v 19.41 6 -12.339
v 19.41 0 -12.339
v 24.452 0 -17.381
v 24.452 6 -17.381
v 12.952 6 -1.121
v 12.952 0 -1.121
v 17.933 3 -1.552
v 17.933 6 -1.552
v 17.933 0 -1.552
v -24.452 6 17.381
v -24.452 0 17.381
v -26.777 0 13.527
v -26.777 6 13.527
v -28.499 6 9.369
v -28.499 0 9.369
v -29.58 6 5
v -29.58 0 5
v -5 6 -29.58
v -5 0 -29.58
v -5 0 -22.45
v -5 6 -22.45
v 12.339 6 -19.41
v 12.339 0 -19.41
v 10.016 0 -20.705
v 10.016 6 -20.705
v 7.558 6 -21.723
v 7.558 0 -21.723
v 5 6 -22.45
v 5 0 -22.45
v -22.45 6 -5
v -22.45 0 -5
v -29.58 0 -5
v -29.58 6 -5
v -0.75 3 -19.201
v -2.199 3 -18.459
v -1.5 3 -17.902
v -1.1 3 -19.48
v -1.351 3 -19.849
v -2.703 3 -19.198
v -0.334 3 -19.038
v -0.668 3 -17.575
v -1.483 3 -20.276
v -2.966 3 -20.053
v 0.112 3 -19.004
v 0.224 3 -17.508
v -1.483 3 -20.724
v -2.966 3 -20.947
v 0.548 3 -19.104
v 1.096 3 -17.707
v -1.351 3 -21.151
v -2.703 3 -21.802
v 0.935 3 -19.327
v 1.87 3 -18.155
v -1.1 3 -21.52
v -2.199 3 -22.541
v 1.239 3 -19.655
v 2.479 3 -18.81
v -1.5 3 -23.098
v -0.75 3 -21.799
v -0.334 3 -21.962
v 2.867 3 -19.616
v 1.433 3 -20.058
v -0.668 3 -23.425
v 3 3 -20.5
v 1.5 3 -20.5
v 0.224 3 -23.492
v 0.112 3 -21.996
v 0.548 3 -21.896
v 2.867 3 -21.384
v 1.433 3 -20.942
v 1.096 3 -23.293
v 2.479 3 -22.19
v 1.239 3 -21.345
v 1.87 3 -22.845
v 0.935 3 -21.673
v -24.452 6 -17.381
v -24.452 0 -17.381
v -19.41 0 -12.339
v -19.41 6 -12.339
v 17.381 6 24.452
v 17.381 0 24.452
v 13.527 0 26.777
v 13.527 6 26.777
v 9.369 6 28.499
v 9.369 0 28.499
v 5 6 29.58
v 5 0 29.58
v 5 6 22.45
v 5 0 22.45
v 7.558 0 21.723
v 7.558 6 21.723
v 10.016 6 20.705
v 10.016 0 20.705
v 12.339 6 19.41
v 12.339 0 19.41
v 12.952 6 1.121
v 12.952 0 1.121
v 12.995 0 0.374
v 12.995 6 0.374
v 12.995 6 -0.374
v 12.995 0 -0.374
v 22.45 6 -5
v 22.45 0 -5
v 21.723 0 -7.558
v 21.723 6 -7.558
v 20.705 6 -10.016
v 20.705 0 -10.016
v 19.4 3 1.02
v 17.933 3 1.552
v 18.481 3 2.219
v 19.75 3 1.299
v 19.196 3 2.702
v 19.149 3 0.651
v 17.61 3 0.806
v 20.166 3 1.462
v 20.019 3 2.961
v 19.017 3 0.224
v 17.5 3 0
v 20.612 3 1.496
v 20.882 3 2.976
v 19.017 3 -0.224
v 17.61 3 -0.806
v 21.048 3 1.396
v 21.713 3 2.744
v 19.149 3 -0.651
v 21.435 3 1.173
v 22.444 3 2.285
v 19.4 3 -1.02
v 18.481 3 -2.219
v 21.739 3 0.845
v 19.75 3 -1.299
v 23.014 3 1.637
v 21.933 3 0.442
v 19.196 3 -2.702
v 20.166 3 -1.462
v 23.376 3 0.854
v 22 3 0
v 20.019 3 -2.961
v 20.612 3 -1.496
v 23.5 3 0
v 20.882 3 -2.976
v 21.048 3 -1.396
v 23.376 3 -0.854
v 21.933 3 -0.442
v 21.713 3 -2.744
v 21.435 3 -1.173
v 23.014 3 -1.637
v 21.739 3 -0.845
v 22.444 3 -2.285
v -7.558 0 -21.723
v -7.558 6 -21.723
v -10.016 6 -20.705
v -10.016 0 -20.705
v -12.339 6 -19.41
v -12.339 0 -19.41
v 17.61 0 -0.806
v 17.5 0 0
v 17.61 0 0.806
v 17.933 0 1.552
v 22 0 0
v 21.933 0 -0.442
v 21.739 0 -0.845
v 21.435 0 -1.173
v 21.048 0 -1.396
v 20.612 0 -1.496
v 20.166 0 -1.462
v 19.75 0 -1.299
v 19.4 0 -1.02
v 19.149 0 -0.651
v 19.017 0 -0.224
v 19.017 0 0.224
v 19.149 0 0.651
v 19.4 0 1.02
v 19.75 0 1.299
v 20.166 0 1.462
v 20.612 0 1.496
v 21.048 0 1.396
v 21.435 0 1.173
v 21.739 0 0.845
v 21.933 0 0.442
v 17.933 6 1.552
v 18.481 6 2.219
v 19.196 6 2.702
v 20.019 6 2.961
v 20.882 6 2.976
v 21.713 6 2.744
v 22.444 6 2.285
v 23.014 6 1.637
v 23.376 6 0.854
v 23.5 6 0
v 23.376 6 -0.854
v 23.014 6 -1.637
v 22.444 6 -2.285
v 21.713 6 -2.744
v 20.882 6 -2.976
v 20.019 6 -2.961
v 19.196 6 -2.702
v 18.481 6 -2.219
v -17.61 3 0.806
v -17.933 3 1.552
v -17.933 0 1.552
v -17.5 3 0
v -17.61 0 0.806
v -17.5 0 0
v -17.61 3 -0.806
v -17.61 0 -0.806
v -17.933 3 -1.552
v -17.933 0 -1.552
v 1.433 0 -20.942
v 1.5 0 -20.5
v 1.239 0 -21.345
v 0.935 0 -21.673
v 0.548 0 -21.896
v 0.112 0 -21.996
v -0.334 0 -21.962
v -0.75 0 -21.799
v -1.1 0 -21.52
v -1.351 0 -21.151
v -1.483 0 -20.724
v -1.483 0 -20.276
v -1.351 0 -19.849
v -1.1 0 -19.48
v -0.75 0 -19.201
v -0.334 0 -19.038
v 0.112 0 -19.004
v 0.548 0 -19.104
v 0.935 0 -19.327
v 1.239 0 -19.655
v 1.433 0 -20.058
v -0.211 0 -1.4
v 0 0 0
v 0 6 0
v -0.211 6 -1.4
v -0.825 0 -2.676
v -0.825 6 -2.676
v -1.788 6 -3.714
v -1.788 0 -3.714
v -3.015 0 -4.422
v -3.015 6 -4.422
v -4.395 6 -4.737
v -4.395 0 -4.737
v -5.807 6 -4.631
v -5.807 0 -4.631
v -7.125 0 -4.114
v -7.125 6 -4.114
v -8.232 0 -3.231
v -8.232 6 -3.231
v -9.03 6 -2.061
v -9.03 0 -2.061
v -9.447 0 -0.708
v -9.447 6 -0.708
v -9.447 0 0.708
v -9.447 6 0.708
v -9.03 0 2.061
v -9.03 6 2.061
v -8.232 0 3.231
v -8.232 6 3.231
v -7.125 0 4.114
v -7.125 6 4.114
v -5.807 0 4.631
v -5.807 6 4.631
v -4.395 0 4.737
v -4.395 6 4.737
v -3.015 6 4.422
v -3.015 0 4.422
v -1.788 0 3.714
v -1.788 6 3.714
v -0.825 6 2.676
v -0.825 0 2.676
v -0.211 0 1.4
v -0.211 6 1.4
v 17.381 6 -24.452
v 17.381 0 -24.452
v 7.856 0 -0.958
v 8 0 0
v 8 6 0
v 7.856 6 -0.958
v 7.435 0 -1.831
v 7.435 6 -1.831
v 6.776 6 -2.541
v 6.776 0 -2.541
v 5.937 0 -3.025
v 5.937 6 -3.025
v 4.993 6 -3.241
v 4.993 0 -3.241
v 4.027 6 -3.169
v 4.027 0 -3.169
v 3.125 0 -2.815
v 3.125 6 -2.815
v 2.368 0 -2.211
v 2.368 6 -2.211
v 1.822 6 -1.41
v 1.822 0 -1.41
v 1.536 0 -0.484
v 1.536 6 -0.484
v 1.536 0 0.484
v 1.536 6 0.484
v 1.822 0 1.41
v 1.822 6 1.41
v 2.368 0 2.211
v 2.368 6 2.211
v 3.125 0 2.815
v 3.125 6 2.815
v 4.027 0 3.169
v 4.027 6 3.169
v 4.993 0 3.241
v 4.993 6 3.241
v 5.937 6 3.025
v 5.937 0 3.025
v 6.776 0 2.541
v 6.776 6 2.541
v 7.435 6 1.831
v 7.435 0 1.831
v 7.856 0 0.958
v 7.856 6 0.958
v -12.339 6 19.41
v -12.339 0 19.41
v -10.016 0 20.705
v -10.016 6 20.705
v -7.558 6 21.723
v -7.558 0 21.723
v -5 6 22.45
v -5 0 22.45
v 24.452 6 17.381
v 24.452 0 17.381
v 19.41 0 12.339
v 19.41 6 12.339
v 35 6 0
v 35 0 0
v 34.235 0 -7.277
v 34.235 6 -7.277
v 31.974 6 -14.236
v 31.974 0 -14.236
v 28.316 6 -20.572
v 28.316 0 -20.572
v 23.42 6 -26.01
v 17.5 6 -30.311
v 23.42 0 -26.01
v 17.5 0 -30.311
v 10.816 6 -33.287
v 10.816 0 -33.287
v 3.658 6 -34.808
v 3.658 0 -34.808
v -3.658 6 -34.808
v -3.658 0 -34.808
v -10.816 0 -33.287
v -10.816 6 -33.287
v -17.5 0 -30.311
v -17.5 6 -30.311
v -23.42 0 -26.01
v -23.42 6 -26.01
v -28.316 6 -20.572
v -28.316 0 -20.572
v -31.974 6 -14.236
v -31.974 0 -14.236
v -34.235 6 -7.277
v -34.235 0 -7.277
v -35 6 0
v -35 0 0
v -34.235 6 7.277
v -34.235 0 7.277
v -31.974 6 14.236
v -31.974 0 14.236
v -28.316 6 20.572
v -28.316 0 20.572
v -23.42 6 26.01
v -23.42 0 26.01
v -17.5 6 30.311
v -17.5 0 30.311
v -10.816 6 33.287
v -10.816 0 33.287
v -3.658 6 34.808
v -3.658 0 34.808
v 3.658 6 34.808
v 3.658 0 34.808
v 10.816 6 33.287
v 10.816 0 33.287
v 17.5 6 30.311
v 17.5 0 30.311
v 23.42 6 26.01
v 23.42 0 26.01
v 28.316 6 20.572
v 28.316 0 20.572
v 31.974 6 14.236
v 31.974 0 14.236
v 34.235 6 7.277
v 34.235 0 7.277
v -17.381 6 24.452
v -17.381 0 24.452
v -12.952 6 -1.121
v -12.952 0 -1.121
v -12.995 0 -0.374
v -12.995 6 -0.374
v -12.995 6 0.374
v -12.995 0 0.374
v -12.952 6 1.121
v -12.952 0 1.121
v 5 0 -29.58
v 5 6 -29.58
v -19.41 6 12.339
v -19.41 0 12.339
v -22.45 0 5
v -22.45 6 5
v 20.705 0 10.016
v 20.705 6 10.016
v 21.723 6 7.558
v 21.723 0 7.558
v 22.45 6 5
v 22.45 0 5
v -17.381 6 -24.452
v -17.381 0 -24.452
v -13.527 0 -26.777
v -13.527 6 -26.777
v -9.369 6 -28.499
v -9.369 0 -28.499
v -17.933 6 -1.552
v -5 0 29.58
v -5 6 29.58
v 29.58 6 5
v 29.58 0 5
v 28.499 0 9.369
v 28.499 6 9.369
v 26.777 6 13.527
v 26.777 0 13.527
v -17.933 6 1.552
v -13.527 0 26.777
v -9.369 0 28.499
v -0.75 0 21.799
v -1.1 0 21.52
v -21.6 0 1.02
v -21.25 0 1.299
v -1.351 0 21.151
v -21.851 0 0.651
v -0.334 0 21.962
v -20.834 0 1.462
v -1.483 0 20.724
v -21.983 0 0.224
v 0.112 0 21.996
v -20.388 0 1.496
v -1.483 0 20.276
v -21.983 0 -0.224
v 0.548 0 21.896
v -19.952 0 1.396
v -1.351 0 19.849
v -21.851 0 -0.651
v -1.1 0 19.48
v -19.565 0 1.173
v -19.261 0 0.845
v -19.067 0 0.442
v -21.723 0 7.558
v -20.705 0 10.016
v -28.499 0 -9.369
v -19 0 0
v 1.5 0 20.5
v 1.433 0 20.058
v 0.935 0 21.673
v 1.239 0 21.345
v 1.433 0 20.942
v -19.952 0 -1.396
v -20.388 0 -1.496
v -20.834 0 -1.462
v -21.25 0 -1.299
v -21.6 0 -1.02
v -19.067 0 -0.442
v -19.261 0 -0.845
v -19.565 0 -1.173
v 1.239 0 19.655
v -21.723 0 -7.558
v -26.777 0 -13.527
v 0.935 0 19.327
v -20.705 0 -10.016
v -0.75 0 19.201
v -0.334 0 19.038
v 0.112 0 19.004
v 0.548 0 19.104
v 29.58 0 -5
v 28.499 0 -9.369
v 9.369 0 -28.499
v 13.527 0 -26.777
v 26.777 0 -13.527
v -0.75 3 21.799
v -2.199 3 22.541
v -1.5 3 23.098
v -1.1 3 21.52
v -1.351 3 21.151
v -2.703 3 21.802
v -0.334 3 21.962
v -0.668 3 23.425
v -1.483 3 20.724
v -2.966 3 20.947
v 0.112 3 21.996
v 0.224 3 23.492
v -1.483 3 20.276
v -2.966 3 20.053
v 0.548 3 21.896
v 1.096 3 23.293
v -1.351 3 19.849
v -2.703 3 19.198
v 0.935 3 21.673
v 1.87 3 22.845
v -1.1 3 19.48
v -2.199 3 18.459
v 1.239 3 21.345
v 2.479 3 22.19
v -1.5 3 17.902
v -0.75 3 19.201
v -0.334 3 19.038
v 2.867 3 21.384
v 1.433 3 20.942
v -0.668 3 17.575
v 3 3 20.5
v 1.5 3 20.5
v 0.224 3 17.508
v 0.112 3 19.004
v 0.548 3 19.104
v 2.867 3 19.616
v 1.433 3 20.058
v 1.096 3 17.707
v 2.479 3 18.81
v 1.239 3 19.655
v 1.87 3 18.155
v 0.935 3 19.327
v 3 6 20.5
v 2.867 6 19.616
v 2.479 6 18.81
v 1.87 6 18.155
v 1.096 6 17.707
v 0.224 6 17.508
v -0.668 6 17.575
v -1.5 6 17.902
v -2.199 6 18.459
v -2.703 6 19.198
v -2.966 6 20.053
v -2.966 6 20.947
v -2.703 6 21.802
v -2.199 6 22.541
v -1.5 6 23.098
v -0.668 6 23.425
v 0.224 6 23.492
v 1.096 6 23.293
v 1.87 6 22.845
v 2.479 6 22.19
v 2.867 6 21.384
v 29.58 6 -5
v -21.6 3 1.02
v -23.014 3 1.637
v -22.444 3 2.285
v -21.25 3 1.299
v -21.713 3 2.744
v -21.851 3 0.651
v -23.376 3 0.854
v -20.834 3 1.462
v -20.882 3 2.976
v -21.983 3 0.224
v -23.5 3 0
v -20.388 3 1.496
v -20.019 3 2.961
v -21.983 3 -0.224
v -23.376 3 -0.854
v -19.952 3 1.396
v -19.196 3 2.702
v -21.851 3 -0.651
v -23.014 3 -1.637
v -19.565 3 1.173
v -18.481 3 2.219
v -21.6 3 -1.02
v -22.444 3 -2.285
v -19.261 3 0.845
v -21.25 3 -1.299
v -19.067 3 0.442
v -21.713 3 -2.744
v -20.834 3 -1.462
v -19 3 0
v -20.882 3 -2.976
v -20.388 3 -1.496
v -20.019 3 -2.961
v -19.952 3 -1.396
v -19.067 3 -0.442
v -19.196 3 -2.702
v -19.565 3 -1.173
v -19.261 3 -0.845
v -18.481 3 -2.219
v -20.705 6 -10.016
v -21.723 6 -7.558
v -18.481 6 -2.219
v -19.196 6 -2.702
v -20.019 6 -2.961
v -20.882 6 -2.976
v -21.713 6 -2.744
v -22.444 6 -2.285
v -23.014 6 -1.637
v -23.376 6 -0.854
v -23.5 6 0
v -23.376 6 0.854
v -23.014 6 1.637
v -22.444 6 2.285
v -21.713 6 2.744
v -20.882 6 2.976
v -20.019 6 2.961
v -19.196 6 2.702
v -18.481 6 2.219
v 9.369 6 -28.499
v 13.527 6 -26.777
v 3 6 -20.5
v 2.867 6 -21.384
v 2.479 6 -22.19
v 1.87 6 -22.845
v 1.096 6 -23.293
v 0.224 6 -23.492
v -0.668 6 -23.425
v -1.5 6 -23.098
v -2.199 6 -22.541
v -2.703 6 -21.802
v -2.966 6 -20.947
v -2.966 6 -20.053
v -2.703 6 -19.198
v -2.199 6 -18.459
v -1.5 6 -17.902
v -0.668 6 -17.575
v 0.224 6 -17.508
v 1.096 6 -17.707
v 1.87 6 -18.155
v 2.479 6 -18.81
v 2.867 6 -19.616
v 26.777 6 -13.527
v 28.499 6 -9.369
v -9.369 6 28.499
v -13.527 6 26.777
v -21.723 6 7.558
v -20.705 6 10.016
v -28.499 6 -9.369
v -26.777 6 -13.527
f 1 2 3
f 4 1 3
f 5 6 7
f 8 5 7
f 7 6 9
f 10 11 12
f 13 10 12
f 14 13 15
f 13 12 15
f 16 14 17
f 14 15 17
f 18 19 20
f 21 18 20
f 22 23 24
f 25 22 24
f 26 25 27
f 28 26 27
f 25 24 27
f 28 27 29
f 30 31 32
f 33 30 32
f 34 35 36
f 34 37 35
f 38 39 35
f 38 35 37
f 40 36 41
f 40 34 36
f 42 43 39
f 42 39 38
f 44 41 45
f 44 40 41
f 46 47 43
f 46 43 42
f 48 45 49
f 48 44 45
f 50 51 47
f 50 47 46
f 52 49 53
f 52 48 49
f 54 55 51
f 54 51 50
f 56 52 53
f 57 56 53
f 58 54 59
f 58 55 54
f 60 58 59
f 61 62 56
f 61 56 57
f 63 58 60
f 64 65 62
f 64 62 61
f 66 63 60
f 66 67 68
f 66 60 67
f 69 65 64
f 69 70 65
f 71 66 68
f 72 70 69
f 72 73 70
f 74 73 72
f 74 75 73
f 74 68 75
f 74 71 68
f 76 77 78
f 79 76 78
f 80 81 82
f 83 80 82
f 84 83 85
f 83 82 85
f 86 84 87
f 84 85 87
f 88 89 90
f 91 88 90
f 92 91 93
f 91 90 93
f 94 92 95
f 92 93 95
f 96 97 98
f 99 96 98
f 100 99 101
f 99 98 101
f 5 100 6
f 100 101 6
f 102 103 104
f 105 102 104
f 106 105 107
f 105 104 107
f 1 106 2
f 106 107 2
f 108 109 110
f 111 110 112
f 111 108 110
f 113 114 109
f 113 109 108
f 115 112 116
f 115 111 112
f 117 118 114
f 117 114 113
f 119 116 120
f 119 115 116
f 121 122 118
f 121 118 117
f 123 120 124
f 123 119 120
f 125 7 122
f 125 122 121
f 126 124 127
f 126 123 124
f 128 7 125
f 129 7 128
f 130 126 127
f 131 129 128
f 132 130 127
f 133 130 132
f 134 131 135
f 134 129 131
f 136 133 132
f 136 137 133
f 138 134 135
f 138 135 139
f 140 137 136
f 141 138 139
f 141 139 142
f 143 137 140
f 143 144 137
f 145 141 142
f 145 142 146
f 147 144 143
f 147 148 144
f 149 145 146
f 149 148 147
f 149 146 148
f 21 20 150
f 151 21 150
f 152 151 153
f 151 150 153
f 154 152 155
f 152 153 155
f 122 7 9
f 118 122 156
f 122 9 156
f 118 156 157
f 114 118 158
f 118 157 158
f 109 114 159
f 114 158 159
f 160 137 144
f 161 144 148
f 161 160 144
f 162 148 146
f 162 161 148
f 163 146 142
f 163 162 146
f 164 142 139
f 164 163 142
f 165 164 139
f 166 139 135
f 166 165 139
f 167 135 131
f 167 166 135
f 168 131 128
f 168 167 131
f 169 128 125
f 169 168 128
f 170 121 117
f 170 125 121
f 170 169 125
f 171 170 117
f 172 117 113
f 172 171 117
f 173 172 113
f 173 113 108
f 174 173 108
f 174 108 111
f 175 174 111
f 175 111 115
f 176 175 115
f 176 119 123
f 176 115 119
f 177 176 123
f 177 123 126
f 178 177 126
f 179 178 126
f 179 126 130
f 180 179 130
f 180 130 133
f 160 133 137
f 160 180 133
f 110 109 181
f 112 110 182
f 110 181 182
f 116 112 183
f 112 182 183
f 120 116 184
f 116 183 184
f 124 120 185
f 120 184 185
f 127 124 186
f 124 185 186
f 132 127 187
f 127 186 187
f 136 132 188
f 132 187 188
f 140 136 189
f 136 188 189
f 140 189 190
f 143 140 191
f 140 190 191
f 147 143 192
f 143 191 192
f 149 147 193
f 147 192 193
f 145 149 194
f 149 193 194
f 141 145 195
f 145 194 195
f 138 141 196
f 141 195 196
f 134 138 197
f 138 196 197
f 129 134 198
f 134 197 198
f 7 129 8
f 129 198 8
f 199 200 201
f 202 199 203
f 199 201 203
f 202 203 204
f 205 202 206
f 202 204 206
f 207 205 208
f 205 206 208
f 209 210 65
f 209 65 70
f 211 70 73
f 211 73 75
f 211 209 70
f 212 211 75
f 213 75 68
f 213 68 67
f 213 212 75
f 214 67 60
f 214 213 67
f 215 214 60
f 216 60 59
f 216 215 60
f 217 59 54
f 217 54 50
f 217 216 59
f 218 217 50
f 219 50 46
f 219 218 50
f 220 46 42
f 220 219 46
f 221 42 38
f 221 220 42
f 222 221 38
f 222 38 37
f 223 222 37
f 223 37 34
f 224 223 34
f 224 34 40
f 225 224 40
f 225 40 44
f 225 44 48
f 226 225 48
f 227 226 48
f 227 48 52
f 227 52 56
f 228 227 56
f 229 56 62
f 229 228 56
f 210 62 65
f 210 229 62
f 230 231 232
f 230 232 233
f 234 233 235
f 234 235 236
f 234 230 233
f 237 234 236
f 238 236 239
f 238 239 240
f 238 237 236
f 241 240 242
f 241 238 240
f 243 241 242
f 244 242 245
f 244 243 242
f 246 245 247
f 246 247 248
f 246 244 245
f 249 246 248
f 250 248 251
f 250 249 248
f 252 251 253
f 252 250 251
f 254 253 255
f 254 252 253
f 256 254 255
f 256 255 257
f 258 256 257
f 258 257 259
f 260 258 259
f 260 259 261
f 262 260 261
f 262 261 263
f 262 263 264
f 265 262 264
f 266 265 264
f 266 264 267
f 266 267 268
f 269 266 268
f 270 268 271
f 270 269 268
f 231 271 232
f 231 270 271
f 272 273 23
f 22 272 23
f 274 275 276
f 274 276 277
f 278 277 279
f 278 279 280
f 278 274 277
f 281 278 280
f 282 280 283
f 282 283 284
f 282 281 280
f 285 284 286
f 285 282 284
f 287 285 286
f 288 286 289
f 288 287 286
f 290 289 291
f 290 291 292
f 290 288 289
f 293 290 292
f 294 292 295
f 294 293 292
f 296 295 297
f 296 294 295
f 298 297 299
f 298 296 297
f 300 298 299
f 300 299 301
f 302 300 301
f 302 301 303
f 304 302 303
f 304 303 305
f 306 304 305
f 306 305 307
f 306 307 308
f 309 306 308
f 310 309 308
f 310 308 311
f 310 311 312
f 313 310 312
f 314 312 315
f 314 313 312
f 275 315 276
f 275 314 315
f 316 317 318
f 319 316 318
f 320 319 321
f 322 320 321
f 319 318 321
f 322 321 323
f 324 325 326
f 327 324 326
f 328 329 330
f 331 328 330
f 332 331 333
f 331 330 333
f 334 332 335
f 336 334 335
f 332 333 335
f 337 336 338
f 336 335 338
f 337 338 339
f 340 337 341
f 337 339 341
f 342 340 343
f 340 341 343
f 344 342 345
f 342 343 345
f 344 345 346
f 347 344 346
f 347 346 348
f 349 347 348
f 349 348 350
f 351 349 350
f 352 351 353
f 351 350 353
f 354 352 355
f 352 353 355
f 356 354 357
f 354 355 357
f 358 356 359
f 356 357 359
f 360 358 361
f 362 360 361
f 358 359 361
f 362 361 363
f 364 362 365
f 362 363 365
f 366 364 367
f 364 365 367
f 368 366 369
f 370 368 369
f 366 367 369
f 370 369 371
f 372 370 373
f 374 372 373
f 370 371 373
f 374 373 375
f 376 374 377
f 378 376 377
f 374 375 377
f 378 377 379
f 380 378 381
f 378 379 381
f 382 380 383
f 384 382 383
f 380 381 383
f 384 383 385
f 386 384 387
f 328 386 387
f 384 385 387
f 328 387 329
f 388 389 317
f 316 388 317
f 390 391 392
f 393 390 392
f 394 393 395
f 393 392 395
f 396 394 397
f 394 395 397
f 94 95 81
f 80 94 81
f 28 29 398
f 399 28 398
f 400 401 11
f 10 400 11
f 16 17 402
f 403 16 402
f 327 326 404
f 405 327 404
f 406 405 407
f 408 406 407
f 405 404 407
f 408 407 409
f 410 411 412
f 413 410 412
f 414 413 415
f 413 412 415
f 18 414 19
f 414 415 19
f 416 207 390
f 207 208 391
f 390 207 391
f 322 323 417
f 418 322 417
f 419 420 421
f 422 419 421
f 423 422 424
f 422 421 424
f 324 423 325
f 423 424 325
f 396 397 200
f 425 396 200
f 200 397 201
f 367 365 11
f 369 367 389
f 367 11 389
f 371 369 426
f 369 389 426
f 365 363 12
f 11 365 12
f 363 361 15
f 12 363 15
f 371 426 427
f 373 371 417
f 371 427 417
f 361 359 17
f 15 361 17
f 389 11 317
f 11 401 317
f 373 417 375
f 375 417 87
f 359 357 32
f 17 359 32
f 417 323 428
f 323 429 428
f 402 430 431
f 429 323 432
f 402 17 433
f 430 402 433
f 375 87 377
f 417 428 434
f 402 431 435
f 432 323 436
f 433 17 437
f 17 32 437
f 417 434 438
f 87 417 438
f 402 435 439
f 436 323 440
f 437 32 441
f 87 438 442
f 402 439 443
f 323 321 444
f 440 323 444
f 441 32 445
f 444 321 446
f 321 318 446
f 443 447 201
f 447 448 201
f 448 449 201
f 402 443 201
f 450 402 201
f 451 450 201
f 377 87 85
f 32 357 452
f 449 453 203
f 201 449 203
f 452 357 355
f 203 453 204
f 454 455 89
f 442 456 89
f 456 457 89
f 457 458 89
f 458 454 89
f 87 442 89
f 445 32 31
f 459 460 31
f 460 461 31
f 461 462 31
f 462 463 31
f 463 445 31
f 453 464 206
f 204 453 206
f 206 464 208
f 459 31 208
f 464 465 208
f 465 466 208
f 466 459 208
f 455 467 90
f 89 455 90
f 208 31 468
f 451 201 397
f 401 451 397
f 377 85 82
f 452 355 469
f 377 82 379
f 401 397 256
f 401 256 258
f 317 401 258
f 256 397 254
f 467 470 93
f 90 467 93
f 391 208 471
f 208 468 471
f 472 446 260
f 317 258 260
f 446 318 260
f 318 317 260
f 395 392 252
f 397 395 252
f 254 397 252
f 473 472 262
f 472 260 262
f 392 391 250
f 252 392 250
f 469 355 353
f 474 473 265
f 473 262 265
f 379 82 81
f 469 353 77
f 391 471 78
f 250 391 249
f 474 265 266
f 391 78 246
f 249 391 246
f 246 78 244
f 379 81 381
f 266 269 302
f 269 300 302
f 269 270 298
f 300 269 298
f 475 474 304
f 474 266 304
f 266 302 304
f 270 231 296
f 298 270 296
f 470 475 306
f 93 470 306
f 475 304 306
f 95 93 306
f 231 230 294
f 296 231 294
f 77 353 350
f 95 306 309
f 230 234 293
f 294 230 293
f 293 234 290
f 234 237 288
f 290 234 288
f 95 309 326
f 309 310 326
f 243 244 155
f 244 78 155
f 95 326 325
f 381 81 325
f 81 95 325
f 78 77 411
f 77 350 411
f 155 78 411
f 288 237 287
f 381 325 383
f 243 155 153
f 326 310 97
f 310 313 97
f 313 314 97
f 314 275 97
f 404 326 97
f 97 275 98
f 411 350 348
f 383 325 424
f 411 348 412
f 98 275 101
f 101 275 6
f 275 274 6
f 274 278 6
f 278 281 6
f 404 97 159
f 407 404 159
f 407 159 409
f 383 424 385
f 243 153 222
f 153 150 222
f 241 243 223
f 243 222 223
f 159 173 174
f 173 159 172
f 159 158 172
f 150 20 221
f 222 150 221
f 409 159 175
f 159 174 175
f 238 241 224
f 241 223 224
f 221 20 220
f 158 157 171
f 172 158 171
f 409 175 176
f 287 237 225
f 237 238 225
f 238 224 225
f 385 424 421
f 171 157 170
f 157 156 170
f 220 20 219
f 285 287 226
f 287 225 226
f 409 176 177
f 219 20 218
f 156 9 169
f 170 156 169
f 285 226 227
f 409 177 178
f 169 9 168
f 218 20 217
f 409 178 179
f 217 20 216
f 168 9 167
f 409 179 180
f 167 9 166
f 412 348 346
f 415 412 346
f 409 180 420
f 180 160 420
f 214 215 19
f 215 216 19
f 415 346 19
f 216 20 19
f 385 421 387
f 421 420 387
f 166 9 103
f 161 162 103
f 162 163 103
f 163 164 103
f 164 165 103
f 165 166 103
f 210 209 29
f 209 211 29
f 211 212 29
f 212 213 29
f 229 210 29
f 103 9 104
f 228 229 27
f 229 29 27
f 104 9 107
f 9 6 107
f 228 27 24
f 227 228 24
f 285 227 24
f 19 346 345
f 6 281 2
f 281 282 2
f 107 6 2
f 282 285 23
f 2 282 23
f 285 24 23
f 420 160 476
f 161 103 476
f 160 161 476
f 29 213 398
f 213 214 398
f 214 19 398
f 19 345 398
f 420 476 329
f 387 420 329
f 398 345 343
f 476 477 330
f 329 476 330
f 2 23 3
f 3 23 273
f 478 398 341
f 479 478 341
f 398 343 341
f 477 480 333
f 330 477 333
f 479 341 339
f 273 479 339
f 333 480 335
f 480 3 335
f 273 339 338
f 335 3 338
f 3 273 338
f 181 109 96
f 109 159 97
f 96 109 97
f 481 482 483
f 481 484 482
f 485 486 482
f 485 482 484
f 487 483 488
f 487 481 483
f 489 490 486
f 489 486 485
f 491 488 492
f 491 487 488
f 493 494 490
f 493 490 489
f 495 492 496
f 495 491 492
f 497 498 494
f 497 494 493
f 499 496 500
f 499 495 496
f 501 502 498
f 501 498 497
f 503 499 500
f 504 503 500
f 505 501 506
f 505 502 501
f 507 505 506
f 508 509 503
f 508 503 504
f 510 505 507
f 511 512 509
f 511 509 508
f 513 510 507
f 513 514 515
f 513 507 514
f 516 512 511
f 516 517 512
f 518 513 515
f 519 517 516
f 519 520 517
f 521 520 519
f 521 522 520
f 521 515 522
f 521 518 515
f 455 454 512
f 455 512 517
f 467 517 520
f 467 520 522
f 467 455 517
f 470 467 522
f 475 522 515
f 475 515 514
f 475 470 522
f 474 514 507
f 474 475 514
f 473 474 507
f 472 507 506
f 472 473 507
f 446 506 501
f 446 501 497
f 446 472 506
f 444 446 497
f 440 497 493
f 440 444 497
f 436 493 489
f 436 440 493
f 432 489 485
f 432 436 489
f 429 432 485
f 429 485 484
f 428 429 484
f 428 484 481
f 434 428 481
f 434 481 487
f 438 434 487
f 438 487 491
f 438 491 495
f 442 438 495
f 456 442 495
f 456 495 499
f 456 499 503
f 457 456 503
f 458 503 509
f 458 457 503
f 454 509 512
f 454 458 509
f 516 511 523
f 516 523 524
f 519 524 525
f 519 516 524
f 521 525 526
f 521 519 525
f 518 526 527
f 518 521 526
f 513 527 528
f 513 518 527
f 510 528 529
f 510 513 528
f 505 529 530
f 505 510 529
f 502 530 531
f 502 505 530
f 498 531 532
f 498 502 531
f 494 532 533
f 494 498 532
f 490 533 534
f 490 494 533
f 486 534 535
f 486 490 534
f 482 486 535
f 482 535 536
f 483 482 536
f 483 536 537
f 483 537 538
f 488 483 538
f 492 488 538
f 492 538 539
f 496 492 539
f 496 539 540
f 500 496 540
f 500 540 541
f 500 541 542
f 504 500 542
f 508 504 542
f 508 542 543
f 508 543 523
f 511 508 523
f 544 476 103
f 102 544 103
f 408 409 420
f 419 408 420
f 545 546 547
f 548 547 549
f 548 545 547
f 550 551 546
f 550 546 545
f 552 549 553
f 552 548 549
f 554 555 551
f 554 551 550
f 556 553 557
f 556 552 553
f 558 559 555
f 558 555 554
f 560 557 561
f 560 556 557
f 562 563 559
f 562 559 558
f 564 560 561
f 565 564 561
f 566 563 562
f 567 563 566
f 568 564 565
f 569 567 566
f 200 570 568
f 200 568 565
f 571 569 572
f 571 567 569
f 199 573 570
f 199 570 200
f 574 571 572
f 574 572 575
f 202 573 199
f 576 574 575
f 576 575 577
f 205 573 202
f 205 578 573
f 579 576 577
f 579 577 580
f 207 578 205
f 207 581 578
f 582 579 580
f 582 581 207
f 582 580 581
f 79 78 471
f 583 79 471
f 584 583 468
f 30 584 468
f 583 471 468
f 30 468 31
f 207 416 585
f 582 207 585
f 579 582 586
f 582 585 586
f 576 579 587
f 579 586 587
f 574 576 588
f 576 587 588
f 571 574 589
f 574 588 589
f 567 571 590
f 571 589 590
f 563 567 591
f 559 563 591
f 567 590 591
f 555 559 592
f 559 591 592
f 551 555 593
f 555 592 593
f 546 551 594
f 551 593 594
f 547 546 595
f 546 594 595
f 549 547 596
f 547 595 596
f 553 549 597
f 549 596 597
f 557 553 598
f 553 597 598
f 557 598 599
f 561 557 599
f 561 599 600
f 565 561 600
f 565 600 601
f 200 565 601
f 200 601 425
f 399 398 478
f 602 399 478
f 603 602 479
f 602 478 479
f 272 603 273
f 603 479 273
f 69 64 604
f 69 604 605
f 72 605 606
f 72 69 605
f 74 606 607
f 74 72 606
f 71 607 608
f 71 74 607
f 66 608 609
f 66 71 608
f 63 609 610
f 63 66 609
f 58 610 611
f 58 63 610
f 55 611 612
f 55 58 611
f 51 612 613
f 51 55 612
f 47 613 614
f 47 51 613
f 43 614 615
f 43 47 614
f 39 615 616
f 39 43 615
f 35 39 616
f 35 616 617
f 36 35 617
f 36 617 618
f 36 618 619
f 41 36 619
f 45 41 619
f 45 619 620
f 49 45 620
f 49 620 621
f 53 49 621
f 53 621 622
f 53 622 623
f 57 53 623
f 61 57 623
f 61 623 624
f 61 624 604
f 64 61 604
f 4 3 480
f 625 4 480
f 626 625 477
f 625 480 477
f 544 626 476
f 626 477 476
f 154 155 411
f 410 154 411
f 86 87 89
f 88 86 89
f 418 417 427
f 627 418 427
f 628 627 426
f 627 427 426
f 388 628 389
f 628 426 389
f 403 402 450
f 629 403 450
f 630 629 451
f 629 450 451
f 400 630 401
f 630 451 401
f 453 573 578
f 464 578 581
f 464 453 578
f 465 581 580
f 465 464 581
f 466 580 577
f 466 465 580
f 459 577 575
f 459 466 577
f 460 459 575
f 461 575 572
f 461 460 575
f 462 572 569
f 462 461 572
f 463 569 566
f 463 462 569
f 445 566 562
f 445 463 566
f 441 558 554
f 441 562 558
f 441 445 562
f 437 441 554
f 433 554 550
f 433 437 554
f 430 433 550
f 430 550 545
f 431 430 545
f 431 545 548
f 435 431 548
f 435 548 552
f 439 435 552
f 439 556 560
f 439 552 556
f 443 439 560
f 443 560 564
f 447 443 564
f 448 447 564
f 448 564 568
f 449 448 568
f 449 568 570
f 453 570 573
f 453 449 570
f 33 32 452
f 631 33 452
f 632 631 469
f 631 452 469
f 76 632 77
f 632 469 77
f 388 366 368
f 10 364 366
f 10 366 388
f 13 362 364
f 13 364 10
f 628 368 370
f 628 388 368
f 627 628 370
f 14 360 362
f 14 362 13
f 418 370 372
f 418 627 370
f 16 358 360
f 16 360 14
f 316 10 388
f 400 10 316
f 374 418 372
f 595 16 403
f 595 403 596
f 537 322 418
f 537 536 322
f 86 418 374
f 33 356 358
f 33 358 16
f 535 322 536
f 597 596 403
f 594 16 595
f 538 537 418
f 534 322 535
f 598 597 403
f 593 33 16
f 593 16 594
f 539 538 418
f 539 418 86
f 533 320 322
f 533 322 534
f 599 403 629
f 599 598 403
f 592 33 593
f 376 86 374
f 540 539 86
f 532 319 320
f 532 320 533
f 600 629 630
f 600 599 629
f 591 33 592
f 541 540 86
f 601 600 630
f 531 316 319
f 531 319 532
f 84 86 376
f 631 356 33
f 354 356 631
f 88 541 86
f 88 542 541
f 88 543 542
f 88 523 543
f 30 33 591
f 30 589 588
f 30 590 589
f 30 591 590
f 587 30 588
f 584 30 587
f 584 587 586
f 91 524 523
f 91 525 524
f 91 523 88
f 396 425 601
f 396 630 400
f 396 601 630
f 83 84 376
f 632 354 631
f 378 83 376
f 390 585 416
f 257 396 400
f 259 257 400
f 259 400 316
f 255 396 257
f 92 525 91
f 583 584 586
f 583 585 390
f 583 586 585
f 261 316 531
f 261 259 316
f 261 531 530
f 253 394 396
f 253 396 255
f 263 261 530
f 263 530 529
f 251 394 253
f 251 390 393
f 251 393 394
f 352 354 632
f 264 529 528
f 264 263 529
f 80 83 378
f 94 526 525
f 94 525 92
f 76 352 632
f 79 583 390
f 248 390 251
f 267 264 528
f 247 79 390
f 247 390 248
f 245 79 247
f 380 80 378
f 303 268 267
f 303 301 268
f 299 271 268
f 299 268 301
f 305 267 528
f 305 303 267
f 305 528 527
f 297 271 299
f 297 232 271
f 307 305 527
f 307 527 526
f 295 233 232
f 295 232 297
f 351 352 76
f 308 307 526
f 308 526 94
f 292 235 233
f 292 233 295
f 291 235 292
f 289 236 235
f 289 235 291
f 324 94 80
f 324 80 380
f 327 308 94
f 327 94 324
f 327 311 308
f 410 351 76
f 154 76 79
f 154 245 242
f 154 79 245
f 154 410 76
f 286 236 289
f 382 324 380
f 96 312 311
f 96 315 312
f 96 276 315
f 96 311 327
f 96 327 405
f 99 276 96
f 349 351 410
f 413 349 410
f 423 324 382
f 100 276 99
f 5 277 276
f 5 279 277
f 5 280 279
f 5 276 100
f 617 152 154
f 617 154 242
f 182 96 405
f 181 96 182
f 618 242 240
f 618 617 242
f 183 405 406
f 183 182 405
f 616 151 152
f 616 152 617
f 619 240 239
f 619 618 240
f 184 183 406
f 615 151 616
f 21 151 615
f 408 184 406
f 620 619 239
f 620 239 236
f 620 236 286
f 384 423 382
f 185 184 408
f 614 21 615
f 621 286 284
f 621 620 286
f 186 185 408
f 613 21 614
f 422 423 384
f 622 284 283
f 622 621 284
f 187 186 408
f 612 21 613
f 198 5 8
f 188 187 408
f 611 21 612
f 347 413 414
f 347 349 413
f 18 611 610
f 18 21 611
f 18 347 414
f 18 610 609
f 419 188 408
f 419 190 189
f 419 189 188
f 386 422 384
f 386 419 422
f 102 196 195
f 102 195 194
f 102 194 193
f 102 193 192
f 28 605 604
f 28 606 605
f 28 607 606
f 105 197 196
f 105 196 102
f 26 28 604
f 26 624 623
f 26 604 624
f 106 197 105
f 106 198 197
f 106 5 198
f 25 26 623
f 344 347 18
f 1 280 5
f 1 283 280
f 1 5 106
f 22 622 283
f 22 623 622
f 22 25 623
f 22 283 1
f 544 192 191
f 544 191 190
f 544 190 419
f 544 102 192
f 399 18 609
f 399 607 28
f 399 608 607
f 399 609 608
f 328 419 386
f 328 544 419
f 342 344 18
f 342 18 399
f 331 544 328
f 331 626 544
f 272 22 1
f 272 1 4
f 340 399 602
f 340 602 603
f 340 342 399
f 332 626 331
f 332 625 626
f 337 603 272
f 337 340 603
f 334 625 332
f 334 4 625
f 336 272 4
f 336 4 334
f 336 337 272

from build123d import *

# Parameters (mm, degrees)
SKETCH1_R           = 35
SKETCH1_R_2         = 3
SKETCH1_R_3         = 1.5
SKETCH1_R_4         = 4.75
SKETCH1_R_5         = 3.25
BOSS_EXTRUDE2_DEPTH = 6
CUT_EXTRUDE3_START  = 6
SKETCH1_6_R         = 3
CUT_EXTRUDE3_DEPTH  = 3
SKETCH1_7_R         = 3
SKETCH1_7_R_2       = 1.5
BOSS_EXTRUDE3_DEPTH = 3


with BuildPart() as part:
    # Sketch1 → Boss-Extrude2 (new body)
    with BuildSketch(Plane(origin=(0, 0, 0), x_dir=(1, 0, 0), z_dir=(0, 1, 0))):
        Circle(SKETCH1_R)
        with BuildLine():
            Line((-29.580398915, -5), (-22.449944321, -5))
            ThreePointArc((-22.449944321, -5), (-21.249229248, -8.801718944), (-19.410041772, -12.33897396))
            Line((-19.410041772, -12.33897396), (-24.452034569, -17.380966757))
            ThreePointArc((-24.452034569, -17.380966757), (-27.716385975, -11.480502971), (-29.580398915, -5))
        make_face(mode=Mode.SUBTRACT)
        with BuildLine():
            Line((-17.380966757, -24.452034569), (-12.33897396, -19.410041772))
            ThreePointArc((-12.33897396, -19.410041772), (-8.801718944, -21.249229248), (-5, -22.449944321))
            Line((-5, -22.449944321), (-5, -29.580398915))
            ThreePointArc((-5, -29.580398915), (-11.480502971, -27.716385975), (-17.380966757, -24.452034569))
        make_face(mode=Mode.SUBTRACT)
        with BuildLine():
            Line((5, -29.580398915), (5, -22.449944321))
            ThreePointArc((5, -22.449944321), (8.801718944, -21.249229248), (12.33897396, -19.410041772))
            Line((12.33897396, -19.410041772), (17.380966757, -24.452034569))
            ThreePointArc((17.380966757, -24.452034569), (11.480502971, -27.716385975), (5, -29.580398915))
        make_face(mode=Mode.SUBTRACT)
        with BuildLine():
            Line((24.452034569, -17.380966757), (19.410041772, -12.33897396))
            ThreePointArc((19.410041772, -12.33897396), (21.249229248, -8.801718944), (22.449944321, -5))
            Line((22.449944321, -5), (29.580398915, -5))
            ThreePointArc((29.580398915, -5), (27.716385975, -11.480502971), (24.452034569, -17.380966757))
        make_face(mode=Mode.SUBTRACT)
        with BuildLine():
            Line((29.580398915, 5), (22.449944321, 5))
            ThreePointArc((22.449944321, 5), (21.249229248, 8.801718944), (19.410041772, 12.33897396))
            Line((19.410041772, 12.33897396), (24.452034569, 17.380966757))
            ThreePointArc((24.452034569, 17.380966757), (27.716385975, 11.480502971), (29.580398915, 5))
        make_face(mode=Mode.SUBTRACT)
        with BuildLine():
            Line((17.380966757, 24.452034569), (12.33897396, 19.410041772))
            ThreePointArc((12.33897396, 19.410041772), (8.801718944, 21.249229248), (5, 22.449944321))
            Line((5, 22.449944321), (5, 29.580398915))
            ThreePointArc((5, 29.580398915), (11.480502971, 27.716385975), (17.380966757, 24.452034569))
        make_face(mode=Mode.SUBTRACT)
        with BuildLine():
            Line((-5, 29.580398915), (-5, 22.449944321))
            ThreePointArc((-5, 22.449944321), (-8.801718944, 21.249229248), (-12.33897396, 19.410041772))
            Line((-12.33897396, 19.410041772), (-17.380966757, 24.452034569))
            ThreePointArc((-17.380966757, 24.452034569), (-11.480502971, 27.716385975), (-5, 29.580398915))
        make_face(mode=Mode.SUBTRACT)
        with BuildLine():
            Line((-24.452034569, 17.380966757), (-19.410041772, 12.33897396))
            ThreePointArc((-19.410041772, 12.33897396), (-21.249229248, 8.801718944), (-22.449944321, 5))
            Line((-22.449944321, 5), (-29.580398915, 5))
            ThreePointArc((-29.580398915, 5), (-27.716385975, 11.480502971), (-24.452034569, 17.380966757))
        make_face(mode=Mode.SUBTRACT)
        with Locations((0, -20.5)):
            Circle(SKETCH1_R_2, mode=Mode.SUBTRACT)
        with Locations((-20.5, 0)):
            Circle(SKETCH1_R_3, mode=Mode.SUBTRACT)
        with BuildLine():
            Line((-12.951558266, -1.121221875), (-17.932926829, -1.552461058))
            ThreePointArc((-17.932926829, -1.552461058), (-17.5, 0), (-17.932926829, 1.552461058))
            Line((-17.932926829, 1.552461058), (-12.951558266, 1.121221875))
            ThreePointArc((-12.951558266, 1.121221875), (-13, 0), (-12.951558266, -1.121221875))
        make_face(mode=Mode.SUBTRACT)
        with Locations((-4.75, 0)):
            Circle(SKETCH1_R_4, mode=Mode.SUBTRACT)
        with Locations((4.75, 0)):
            Circle(SKETCH1_R_5, mode=Mode.SUBTRACT)
        with BuildLine():
            ThreePointArc((17.932926829, 1.552461058), (17.5, 0), (17.932926829, -1.552461058))
            Line((17.932926829, -1.552461058), (12.951558266, -1.121221875))
            ThreePointArc((12.951558266, -1.121221875), (13, 0), (12.951558266, 1.121221875))
            Line((12.951558266, 1.121221875), (17.932926829, 1.552461058))
        make_face(mode=Mode.SUBTRACT)
        with Locations((20.5, 0)):
            Circle(SKETCH1_R_3, mode=Mode.SUBTRACT)
        with Locations((0, 20.5)):
            Circle(SKETCH1_R_2, mode=Mode.SUBTRACT)
    extrude(amount=BOSS_EXTRUDE2_DEPTH)

    # Sketch1<6> → Cut-Extrude3 (cut)
    with BuildSketch(Plane(origin=(0, 0, 0), x_dir=(1, 0, 0), z_dir=(0, 1, 0)).offset(CUT_EXTRUDE3_START)):
        with Locations((20.5, 0)):
            Circle(SKETCH1_6_R)
        with Locations((-20.5, 0)):
            Circle(SKETCH1_6_R)
    extrude(amount=-CUT_EXTRUDE3_DEPTH, mode=Mode.SUBTRACT)

    # Sketch1<7> → Boss-Extrude3 (add)
    with BuildSketch(Plane(origin=(0, 0, 0), x_dir=(1, 0, 0), z_dir=(0, 1, 0))):
        with Locations((0, 20.5)):
            Circle(SKETCH1_7_R)
        with Locations((0, 20.5)):
            Circle(SKETCH1_7_R_2, mode=Mode.SUBTRACT)
        with Locations((0, -20.5)):
            Circle(SKETCH1_7_R)
        with Locations((0, -20.5)):
            Circle(SKETCH1_7_R_2, mode=Mode.SUBTRACT)
    extrude(amount=BOSS_EXTRUDE3_DEPTH)


solid = part.part
